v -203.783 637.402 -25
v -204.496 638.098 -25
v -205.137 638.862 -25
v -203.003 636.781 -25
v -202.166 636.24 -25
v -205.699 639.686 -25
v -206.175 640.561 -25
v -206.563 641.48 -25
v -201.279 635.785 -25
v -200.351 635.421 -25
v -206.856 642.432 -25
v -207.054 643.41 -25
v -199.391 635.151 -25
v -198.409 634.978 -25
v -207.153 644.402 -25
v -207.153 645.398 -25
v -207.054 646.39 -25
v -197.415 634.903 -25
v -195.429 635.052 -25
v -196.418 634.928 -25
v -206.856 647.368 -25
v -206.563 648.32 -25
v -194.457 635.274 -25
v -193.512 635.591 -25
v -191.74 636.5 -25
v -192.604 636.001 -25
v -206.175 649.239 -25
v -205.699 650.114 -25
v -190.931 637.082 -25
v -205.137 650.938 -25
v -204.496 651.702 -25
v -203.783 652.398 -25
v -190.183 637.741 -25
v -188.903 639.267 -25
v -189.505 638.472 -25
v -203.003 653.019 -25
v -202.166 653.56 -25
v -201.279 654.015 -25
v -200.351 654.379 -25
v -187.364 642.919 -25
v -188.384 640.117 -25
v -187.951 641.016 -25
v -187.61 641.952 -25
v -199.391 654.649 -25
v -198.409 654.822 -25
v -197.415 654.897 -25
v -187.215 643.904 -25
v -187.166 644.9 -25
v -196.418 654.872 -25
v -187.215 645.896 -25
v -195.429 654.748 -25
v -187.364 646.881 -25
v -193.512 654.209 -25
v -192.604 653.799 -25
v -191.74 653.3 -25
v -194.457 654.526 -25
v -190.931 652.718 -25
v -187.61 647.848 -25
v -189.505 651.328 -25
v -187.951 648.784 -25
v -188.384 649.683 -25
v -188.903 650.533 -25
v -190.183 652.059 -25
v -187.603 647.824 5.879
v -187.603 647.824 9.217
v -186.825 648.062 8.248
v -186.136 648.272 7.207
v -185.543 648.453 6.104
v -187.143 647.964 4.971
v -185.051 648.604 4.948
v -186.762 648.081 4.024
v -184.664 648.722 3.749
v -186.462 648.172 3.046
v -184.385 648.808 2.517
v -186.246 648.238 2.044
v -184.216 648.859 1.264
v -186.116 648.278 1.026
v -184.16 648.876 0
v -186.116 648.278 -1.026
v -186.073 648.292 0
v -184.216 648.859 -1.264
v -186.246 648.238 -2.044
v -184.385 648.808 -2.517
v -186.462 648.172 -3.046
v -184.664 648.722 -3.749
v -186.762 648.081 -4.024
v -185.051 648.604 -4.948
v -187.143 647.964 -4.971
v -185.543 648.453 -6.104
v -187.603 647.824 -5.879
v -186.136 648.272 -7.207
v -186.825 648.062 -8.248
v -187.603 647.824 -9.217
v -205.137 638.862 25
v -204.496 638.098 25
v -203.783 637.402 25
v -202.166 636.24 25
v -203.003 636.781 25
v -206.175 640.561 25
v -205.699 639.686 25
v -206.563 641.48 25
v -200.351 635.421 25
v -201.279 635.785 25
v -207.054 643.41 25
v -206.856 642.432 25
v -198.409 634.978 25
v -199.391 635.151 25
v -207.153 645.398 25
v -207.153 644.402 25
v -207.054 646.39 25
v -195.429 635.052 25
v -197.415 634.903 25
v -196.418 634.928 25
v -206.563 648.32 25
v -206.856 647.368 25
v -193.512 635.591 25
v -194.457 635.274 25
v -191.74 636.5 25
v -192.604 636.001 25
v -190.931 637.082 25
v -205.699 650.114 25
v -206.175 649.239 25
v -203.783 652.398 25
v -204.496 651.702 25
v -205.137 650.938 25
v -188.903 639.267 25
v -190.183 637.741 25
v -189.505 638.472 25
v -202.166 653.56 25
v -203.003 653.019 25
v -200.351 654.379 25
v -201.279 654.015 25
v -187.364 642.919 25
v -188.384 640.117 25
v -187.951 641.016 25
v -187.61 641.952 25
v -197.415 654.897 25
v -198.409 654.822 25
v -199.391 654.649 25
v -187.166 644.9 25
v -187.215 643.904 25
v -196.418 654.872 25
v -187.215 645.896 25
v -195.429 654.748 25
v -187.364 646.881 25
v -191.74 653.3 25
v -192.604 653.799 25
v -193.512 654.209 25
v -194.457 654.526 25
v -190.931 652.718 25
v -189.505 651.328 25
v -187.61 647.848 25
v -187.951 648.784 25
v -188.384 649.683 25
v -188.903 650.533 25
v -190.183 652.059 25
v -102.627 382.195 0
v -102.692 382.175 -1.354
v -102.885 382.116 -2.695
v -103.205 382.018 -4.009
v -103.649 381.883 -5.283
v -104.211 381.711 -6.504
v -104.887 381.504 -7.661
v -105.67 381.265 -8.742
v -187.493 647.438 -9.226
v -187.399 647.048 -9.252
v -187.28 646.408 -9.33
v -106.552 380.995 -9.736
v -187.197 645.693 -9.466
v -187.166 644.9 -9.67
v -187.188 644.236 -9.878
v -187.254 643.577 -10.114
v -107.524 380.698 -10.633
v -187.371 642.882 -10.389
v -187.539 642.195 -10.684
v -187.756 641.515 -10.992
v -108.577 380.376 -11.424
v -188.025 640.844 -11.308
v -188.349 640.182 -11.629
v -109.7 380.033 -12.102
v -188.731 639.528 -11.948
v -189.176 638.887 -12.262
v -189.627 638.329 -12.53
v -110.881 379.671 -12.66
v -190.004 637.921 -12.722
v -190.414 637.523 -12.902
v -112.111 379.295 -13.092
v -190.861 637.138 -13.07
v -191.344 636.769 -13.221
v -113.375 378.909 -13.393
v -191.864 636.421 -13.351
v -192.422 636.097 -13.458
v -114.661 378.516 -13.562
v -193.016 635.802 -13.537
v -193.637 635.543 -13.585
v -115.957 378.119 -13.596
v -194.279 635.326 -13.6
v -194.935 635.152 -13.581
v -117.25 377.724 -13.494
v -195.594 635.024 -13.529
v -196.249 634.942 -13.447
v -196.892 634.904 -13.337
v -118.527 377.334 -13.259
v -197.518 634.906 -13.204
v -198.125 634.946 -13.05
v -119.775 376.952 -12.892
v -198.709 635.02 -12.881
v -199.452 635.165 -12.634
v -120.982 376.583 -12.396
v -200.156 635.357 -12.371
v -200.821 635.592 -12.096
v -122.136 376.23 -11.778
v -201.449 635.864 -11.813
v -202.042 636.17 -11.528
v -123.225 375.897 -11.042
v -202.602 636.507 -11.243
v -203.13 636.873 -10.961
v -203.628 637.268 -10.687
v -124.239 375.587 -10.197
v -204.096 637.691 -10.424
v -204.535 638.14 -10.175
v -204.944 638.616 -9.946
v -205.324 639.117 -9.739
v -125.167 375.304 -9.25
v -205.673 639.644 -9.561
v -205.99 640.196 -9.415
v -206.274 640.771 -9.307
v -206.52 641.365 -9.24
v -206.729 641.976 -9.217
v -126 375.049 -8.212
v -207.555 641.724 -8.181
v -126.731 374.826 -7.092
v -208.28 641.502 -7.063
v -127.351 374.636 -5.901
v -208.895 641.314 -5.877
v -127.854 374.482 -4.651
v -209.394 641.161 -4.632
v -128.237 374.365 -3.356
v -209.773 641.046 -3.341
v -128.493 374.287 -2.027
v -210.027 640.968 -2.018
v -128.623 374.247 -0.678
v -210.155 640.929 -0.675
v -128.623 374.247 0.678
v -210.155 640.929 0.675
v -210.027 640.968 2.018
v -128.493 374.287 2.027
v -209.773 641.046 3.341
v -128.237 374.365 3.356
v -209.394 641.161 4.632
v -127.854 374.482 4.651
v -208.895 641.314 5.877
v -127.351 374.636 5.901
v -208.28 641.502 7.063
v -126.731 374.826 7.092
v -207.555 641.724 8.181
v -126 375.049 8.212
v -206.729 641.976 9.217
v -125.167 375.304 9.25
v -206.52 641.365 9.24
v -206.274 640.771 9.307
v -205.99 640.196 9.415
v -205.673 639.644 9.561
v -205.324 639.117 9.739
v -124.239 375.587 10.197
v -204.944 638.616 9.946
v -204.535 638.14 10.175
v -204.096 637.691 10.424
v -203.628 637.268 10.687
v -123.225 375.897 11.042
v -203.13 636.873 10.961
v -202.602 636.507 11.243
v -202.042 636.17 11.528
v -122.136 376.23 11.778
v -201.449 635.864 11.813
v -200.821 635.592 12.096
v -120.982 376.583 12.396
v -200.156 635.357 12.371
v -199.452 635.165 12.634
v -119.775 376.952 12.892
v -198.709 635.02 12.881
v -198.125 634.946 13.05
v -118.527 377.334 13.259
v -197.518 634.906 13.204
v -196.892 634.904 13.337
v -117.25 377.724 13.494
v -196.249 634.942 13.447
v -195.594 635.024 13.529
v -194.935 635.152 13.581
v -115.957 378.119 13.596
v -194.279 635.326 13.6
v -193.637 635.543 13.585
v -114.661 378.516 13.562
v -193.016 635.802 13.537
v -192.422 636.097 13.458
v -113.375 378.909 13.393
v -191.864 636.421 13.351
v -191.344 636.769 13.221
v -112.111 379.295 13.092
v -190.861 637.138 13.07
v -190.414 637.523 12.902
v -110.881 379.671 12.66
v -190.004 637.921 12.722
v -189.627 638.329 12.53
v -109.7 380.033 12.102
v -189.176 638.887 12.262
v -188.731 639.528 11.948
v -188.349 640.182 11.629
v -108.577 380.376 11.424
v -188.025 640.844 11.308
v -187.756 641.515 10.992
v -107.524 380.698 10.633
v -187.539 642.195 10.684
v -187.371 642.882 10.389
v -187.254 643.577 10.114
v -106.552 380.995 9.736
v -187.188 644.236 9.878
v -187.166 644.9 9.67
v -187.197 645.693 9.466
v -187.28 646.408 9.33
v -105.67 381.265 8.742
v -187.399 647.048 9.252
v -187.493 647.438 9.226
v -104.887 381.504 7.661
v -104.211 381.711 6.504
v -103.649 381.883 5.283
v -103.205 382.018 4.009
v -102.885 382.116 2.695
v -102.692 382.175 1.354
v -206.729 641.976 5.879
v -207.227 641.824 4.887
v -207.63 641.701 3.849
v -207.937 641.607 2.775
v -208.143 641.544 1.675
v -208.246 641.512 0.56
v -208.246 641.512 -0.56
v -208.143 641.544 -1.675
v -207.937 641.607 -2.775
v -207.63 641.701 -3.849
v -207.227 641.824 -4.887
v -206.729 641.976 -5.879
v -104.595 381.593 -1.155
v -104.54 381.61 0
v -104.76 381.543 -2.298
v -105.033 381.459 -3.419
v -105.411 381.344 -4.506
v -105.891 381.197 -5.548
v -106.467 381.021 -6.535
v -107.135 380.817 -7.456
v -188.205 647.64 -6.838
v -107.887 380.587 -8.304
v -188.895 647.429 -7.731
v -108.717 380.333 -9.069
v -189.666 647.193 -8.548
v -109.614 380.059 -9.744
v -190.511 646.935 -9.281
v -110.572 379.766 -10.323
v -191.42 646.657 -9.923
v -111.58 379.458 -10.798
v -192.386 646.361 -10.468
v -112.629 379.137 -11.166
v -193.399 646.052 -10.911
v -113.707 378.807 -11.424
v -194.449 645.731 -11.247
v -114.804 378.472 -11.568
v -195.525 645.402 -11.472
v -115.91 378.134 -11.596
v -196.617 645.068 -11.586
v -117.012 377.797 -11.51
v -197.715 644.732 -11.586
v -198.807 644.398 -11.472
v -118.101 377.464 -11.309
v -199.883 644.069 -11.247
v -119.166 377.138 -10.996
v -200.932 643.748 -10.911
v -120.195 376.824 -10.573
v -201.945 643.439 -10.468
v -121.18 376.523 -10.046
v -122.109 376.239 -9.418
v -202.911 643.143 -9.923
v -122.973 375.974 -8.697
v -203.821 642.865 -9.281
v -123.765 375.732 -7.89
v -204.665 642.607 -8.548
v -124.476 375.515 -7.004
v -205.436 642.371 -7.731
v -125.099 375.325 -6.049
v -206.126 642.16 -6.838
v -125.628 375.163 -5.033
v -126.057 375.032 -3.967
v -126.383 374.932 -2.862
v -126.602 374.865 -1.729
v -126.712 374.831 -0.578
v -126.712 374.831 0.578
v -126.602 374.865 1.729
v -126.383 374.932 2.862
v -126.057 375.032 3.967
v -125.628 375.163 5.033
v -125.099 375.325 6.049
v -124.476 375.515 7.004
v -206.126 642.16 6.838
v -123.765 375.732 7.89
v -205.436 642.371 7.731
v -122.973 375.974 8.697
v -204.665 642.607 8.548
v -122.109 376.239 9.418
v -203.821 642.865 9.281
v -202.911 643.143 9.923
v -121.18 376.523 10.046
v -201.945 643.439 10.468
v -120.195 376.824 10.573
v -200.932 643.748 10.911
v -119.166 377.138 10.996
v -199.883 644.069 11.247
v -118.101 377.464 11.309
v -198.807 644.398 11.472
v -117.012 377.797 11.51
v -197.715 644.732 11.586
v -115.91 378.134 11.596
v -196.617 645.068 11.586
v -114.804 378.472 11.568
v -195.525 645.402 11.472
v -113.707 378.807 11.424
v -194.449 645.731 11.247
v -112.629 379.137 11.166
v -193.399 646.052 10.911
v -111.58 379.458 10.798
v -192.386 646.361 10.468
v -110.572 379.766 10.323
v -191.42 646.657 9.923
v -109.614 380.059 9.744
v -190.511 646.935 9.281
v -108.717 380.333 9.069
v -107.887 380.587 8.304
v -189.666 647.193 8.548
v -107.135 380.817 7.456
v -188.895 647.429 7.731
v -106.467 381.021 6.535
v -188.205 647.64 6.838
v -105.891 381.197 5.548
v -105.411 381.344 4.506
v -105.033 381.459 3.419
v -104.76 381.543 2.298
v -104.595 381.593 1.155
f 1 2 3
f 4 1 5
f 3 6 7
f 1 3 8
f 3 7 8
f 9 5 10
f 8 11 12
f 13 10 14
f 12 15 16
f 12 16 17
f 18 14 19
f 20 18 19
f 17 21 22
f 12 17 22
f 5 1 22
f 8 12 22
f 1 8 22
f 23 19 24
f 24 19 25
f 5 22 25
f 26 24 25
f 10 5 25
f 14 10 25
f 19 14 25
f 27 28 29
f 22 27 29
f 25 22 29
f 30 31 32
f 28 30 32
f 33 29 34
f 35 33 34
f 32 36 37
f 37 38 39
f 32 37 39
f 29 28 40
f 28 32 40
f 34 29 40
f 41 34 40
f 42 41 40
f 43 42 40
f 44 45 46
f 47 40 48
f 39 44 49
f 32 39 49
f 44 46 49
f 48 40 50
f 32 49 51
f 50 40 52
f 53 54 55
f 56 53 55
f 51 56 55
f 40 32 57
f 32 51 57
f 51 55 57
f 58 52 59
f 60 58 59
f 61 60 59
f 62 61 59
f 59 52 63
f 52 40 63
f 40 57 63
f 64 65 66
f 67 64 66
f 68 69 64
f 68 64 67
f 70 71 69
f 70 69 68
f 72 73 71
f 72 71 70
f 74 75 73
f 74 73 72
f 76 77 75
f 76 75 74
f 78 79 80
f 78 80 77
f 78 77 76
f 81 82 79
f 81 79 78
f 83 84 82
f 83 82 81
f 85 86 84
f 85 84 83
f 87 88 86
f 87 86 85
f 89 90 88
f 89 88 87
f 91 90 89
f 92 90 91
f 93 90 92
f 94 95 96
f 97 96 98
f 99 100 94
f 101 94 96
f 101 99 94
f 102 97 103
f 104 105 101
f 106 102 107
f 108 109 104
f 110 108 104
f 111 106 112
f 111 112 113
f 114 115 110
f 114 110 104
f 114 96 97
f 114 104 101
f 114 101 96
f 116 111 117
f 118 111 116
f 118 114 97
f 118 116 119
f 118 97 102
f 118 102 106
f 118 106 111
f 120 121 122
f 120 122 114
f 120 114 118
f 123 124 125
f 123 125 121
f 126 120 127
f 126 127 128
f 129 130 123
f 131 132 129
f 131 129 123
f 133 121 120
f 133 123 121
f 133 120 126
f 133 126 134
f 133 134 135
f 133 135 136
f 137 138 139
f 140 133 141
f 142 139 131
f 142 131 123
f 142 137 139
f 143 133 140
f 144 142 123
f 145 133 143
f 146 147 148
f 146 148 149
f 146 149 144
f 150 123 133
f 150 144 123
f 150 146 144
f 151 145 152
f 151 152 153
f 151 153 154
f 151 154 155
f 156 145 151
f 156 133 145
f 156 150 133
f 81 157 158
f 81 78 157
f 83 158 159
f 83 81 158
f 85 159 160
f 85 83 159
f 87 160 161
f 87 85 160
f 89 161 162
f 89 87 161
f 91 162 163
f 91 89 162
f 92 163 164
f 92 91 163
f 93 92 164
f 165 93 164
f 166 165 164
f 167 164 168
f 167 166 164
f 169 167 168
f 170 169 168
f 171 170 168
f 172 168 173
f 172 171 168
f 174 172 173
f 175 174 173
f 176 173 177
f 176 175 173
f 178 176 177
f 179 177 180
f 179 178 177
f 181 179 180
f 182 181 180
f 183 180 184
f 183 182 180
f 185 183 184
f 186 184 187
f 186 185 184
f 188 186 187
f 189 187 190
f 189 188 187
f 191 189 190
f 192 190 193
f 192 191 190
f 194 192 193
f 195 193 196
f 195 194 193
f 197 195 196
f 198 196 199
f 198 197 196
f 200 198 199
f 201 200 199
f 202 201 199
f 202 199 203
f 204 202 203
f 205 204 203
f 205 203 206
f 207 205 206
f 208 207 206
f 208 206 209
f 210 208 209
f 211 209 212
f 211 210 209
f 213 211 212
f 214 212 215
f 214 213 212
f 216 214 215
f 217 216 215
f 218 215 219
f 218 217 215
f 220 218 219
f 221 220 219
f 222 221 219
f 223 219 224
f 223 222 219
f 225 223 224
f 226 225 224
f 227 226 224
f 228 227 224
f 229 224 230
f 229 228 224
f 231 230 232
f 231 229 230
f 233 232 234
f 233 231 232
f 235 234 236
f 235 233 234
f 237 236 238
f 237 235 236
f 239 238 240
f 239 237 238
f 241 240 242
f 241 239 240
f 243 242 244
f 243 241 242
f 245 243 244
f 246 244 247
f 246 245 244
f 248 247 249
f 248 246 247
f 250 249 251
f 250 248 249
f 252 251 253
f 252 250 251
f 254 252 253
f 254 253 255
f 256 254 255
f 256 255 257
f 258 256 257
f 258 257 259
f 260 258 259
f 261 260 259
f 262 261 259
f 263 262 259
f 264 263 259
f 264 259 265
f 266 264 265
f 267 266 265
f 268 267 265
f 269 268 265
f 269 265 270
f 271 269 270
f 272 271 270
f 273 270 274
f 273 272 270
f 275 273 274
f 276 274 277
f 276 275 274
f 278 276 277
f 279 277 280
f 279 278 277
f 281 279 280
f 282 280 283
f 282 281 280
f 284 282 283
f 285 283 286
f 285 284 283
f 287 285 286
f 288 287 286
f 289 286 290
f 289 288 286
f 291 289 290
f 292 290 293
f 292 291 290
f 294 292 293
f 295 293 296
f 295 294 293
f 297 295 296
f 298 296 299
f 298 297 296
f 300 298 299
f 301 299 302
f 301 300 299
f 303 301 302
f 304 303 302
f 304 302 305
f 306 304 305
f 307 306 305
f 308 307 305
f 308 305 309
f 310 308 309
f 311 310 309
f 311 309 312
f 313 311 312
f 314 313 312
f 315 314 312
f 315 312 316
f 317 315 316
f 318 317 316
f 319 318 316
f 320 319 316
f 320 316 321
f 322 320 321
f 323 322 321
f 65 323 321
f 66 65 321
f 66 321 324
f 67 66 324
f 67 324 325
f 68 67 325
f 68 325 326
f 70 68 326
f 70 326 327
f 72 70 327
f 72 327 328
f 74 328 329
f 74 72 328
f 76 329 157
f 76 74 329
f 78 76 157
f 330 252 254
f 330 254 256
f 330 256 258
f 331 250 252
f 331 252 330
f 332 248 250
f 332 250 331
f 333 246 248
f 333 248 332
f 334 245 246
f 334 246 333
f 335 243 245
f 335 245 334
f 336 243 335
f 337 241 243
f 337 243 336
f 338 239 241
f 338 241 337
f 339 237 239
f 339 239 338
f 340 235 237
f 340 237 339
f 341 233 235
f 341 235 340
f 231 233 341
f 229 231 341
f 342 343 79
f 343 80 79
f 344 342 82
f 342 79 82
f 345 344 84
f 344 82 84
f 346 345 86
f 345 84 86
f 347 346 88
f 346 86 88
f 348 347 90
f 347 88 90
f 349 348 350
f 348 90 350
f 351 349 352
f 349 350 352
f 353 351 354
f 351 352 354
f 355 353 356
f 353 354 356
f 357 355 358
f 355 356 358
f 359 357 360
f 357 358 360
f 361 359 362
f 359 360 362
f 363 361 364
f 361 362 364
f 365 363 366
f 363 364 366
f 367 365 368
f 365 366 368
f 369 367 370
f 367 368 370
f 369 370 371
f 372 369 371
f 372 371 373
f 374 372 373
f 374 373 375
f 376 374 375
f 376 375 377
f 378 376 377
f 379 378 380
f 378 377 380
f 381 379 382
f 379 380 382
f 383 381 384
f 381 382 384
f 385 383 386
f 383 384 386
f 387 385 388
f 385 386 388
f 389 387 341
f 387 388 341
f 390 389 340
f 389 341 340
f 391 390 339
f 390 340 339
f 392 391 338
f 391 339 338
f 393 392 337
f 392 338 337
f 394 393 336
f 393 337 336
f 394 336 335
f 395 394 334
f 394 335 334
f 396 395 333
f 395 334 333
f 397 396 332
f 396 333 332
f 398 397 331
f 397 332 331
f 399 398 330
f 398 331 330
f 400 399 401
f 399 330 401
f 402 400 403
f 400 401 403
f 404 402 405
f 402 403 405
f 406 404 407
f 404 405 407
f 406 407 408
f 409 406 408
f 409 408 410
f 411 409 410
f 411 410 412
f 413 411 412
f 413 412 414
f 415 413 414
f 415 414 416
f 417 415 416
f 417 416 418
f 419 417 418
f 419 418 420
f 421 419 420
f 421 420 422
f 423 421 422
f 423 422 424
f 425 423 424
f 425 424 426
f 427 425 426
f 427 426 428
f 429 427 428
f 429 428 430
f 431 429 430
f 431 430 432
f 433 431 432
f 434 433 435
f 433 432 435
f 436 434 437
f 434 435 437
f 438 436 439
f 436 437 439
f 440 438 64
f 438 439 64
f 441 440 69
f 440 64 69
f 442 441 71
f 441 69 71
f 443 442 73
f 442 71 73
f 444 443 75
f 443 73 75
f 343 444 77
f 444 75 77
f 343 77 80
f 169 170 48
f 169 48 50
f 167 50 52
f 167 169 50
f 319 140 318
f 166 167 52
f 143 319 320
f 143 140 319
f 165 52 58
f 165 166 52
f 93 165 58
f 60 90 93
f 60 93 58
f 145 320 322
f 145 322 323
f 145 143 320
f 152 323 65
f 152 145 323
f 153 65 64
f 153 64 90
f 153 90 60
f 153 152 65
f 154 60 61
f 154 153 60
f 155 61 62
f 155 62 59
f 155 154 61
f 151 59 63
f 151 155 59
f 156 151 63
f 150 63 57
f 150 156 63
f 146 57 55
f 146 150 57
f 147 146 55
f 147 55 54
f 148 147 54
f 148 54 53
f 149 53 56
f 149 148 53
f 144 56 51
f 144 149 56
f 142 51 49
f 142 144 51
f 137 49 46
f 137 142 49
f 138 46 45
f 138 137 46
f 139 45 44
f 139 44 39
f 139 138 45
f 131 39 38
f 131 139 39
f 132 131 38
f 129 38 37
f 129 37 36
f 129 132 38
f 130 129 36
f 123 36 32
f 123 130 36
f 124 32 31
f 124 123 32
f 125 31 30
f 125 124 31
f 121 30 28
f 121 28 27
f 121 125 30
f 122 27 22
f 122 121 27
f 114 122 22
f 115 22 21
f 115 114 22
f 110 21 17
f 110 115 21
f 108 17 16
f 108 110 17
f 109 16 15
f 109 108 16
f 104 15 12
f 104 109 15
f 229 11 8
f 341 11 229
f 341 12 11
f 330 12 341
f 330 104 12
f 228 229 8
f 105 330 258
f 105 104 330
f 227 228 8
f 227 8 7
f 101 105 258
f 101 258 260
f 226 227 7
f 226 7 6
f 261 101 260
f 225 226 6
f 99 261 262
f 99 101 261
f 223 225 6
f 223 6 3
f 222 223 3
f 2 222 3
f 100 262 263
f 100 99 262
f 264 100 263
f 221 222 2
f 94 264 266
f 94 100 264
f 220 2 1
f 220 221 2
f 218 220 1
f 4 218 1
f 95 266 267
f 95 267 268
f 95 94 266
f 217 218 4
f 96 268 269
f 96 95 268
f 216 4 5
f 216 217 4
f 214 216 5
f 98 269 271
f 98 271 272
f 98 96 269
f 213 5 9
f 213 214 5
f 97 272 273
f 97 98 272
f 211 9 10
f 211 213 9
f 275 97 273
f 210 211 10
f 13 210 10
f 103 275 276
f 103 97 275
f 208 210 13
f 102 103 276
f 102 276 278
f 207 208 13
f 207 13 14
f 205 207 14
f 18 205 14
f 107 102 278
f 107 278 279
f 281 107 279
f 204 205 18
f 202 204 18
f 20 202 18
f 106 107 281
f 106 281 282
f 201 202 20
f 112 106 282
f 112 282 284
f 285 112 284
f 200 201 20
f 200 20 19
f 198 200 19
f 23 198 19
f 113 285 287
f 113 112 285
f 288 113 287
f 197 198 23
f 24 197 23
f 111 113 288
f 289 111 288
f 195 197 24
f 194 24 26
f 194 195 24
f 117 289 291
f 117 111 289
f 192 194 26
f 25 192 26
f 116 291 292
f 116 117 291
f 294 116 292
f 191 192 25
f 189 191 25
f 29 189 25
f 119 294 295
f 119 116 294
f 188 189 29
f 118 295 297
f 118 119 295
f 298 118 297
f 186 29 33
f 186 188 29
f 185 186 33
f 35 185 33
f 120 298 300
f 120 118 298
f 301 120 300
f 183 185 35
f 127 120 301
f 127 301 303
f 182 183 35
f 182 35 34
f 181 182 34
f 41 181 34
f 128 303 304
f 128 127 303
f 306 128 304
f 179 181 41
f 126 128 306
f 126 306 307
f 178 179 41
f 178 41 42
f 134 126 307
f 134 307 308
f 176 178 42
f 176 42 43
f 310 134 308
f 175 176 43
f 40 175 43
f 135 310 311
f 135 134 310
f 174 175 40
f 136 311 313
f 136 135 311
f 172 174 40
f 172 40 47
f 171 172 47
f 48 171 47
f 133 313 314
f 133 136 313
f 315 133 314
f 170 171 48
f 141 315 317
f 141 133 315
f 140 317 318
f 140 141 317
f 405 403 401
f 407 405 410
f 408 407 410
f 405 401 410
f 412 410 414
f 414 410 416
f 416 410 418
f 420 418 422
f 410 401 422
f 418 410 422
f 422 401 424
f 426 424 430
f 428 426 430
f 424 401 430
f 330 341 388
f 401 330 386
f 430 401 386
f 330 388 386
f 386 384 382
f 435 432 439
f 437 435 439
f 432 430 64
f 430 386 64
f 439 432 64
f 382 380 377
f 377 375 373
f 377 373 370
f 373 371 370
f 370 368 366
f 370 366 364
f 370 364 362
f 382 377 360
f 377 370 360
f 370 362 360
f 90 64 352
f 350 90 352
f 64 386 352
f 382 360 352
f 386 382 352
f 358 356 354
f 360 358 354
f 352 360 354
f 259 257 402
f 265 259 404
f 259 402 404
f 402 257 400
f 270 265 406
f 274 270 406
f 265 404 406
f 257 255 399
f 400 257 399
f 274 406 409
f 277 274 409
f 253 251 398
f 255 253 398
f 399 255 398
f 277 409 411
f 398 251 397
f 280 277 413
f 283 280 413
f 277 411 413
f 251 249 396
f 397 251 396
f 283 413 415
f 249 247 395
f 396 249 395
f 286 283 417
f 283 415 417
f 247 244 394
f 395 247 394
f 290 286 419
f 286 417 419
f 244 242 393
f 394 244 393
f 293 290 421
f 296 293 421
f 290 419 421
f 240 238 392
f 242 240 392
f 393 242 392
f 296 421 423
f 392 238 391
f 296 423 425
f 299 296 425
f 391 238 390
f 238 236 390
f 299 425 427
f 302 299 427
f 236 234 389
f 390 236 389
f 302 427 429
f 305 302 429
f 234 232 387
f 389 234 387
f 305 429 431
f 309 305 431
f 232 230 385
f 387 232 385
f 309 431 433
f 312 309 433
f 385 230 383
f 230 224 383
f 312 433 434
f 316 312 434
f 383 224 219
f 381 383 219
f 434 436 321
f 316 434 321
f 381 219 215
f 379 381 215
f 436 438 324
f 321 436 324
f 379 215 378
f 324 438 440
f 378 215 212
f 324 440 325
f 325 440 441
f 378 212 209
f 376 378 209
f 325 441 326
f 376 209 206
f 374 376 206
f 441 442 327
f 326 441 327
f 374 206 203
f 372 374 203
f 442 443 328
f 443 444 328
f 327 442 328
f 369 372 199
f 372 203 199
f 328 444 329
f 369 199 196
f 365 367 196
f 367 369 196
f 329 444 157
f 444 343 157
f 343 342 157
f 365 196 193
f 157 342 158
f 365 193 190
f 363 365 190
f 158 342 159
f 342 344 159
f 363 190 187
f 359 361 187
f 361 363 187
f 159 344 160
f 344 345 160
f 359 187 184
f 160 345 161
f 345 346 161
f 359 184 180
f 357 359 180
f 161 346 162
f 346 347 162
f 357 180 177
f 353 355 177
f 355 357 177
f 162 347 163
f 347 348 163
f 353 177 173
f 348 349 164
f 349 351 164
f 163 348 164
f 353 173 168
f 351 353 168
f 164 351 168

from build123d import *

# Parameters (mm, degrees)
TUBO_TIJA_PROFILE_R         = 13.6
CABEZA_PROFILE_R            = 10
VACIADO_TUBO_TIJA_PROFILE_R = 11.6


with BuildPart() as part:
    # Tubo_tija: sweep along a curve in space
    with BuildLine() as tubo_tija_path:
        Line((-115.633009218, 378.218530983, 0), (-197.165716473, 644.9, 0))
    # Tubo_tija profile (on start of the path) → Tubo_tija (sweep)
    with BuildSketch(Plane(origin=(-115.633009218, 378.218530983, 0), x_dir=(0.9563047559630354, 0.2923717047227369, 0), z_dir=(-0.2923717047227369, 0.9563047559630354, 0))):
        Circle(TUBO_TIJA_PROFILE_R)
    sweep(path=tubo_tija_path.line)

    # Cabeza: sweep along a curve in space
    with BuildLine() as cabeza_path:
        Line((-197.165716473, 644.9, -25), (-197.165716473, 644.9, 25))
    # Cabeza profile (on start of the path) → Cabeza (sweep)
    with BuildSketch(Plane(origin=(-197.165716473, 644.9, -25), x_dir=(1, 0, 0), z_dir=(0, 0, 1))):
        Circle(CABEZA_PROFILE_R)
    sweep(path=cabeza_path.line)

    # Vaciado_Tubo_tija: sweep along a curve in space
    with BuildLine() as vaciado_tubo_tija_path:
        Line((-115.633009218, 378.218530983, 0), (-197.165716473, 644.9, 0))
    # Vaciado_Tubo_tija profile (on start of the path) → Vaciado_Tubo_tija (sweep, cut)
    with BuildSketch(Plane(origin=(-115.633009218, 378.218530983, 0), x_dir=(0.9563047559630354, 0.2923717047227369, 0), z_dir=(-0.2923717047227369, 0.9563047559630354, 0))):
        Circle(VACIADO_TUBO_TIJA_PROFILE_R)
    sweep(path=vaciado_tubo_tija_path.line, mode=Mode.SUBTRACT)


solid = part.part
